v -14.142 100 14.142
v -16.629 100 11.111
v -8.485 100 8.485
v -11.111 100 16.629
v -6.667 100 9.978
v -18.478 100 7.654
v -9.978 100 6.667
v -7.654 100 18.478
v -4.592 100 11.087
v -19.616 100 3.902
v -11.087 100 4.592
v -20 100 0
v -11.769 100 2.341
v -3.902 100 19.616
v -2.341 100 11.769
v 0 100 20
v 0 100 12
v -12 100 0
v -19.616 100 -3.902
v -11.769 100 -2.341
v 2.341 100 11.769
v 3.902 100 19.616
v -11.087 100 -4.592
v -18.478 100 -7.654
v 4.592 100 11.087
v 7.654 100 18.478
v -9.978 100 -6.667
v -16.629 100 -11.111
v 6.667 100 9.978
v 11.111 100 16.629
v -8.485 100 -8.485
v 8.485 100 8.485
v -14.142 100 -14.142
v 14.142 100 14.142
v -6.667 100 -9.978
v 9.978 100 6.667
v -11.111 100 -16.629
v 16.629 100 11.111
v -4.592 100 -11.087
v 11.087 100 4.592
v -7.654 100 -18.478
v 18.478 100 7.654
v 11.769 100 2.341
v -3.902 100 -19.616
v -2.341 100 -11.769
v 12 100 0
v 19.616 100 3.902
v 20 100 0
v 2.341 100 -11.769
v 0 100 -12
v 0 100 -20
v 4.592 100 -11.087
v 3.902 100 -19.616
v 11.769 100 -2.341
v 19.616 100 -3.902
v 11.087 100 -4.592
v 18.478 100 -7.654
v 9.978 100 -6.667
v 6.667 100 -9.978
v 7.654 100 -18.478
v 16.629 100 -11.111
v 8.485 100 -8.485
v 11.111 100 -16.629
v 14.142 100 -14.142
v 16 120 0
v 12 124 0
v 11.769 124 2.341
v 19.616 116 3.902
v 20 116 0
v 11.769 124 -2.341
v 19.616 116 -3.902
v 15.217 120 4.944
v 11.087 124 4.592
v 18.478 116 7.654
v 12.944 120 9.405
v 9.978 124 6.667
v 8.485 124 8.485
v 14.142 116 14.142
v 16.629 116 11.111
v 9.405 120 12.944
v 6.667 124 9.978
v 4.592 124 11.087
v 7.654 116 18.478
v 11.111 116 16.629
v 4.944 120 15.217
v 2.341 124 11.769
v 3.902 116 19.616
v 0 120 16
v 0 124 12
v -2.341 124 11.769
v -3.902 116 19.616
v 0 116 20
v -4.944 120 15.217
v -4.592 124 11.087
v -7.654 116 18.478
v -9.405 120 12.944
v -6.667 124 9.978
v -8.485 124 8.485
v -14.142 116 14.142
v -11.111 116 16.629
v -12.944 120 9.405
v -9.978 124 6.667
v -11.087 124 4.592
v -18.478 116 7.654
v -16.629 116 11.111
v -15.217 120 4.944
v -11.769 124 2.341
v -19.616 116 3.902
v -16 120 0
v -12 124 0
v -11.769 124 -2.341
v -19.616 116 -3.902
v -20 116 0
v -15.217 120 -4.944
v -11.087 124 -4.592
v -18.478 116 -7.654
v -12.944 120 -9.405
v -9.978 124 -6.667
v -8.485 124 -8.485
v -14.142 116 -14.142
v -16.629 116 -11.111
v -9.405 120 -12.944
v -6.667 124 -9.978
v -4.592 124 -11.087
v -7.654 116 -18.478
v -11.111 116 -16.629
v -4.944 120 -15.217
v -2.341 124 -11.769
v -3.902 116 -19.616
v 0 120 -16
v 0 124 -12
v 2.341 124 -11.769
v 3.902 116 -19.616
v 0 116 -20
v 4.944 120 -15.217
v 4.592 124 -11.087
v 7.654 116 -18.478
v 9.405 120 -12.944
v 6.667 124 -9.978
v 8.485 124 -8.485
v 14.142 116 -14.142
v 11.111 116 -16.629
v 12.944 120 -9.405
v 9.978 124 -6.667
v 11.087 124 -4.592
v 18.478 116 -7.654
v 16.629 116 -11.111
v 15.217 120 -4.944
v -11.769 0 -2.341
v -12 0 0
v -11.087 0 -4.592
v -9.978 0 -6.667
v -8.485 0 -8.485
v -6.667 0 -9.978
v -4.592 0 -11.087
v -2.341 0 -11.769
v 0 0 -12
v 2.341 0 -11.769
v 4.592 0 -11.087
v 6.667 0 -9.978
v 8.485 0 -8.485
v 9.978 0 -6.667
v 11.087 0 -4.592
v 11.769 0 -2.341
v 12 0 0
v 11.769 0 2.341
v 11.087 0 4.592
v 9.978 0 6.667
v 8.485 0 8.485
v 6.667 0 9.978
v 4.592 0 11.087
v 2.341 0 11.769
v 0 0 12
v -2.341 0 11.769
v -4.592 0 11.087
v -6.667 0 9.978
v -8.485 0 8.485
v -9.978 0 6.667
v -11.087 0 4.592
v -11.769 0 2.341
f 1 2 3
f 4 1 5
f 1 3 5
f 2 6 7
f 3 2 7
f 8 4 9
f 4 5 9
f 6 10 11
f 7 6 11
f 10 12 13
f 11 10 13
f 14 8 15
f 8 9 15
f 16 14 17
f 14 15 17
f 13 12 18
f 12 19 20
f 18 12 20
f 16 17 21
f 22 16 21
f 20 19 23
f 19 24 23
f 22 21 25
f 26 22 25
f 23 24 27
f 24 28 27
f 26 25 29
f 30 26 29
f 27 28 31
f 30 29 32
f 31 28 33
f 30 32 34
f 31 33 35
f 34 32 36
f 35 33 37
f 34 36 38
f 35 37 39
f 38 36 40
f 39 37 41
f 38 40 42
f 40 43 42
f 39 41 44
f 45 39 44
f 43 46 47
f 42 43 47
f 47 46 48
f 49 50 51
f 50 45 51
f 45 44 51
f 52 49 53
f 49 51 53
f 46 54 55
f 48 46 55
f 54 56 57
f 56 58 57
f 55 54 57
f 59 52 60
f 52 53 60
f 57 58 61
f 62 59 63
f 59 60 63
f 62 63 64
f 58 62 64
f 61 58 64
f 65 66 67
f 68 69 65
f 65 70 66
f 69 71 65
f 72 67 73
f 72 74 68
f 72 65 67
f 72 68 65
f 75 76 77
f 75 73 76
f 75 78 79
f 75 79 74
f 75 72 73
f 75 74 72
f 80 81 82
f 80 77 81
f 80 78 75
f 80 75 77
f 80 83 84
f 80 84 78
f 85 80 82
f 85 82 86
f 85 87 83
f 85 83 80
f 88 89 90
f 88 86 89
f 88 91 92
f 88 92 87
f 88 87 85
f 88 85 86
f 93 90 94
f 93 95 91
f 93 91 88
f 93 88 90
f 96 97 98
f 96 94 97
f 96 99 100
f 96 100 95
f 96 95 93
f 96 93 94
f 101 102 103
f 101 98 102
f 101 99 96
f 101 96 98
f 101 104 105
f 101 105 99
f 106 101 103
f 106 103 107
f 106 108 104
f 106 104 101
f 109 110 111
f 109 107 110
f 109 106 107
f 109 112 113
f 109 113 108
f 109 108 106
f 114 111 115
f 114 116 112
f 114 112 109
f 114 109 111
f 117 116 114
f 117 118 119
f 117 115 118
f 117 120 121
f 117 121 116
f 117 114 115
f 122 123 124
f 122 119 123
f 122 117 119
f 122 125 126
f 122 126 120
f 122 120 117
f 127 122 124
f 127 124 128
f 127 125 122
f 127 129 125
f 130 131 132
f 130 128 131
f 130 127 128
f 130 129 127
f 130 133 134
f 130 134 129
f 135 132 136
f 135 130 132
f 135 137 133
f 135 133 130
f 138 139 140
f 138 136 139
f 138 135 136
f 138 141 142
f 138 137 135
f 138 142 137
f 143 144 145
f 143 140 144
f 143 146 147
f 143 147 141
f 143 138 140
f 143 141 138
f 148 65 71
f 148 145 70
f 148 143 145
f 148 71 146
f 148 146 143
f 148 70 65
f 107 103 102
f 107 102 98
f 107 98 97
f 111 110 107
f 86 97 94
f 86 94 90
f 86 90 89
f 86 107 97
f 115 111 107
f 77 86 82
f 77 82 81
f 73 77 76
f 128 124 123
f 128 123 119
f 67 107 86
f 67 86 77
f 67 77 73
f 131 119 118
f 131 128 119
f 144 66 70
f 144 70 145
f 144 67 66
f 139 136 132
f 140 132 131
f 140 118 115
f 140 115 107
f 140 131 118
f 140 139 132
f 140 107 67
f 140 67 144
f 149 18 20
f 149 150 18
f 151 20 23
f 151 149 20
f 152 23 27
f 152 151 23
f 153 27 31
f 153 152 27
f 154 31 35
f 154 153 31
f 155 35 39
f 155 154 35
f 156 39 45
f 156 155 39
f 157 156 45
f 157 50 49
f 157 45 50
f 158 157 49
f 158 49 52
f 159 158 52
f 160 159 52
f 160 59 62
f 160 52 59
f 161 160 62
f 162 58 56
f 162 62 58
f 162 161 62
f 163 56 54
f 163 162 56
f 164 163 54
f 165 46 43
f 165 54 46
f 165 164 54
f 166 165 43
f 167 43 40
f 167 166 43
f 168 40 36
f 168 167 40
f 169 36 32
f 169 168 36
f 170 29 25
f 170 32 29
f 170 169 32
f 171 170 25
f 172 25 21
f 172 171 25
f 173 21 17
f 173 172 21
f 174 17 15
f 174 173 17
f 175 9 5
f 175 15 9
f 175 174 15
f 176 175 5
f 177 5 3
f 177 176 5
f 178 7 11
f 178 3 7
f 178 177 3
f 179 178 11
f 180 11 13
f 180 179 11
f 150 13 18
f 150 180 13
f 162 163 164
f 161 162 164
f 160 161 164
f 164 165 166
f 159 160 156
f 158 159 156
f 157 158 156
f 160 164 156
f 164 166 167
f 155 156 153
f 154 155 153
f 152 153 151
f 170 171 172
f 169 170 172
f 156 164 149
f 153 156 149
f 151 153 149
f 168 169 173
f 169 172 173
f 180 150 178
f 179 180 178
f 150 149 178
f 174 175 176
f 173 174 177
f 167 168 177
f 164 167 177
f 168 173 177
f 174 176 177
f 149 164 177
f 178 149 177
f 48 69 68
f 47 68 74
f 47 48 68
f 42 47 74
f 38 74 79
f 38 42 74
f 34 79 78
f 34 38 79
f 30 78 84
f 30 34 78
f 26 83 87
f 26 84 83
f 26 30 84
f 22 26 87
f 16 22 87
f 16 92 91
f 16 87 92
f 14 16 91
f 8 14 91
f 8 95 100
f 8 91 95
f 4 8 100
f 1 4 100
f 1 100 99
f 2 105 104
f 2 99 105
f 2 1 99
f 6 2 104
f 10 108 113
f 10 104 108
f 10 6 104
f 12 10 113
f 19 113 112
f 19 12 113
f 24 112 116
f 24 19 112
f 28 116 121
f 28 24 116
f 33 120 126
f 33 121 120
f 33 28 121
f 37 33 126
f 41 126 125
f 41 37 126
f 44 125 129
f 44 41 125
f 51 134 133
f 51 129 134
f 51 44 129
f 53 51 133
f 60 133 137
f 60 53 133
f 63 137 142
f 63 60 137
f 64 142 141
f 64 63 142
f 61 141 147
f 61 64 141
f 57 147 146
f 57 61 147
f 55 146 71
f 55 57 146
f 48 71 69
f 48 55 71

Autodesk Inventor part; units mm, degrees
ref_plane "YZ Plane" through (0, 0, 0) normal (1, 0, 0) x (0, 1, 0)
ref_plane "XZ Plane" through (0, 0, 0) normal (0, 1, 0) x (-1, 0, 0)
ref_plane "XY Plane" through (0, 0, 0) normal (0, 0, 1) x (1, 0, 0)
sketch "Sketch1" plane through (0, 0, 0) normal (0, 1, 0) x (-1, 0, 0)
  circle A0 centre (0, 0) radius 12
  dimension "d0" = 24
extrude "Extrusion1" add sketch "Sketch1" along normal blind 100
sketch "Sketch2" plane through (0, 100, 0) normal (0, 1, 0) x (1, 0, 0)
  circle A0 centre (0, 0) radius 20
  dimension "d3" = 40
extrude "Extrusion2" add sketch "Sketch2" along normal blind 24
chamfer "Chamfer1" distance 8 angle 45 1 edges at (-20, 124, 0)
properties part number "axle"
